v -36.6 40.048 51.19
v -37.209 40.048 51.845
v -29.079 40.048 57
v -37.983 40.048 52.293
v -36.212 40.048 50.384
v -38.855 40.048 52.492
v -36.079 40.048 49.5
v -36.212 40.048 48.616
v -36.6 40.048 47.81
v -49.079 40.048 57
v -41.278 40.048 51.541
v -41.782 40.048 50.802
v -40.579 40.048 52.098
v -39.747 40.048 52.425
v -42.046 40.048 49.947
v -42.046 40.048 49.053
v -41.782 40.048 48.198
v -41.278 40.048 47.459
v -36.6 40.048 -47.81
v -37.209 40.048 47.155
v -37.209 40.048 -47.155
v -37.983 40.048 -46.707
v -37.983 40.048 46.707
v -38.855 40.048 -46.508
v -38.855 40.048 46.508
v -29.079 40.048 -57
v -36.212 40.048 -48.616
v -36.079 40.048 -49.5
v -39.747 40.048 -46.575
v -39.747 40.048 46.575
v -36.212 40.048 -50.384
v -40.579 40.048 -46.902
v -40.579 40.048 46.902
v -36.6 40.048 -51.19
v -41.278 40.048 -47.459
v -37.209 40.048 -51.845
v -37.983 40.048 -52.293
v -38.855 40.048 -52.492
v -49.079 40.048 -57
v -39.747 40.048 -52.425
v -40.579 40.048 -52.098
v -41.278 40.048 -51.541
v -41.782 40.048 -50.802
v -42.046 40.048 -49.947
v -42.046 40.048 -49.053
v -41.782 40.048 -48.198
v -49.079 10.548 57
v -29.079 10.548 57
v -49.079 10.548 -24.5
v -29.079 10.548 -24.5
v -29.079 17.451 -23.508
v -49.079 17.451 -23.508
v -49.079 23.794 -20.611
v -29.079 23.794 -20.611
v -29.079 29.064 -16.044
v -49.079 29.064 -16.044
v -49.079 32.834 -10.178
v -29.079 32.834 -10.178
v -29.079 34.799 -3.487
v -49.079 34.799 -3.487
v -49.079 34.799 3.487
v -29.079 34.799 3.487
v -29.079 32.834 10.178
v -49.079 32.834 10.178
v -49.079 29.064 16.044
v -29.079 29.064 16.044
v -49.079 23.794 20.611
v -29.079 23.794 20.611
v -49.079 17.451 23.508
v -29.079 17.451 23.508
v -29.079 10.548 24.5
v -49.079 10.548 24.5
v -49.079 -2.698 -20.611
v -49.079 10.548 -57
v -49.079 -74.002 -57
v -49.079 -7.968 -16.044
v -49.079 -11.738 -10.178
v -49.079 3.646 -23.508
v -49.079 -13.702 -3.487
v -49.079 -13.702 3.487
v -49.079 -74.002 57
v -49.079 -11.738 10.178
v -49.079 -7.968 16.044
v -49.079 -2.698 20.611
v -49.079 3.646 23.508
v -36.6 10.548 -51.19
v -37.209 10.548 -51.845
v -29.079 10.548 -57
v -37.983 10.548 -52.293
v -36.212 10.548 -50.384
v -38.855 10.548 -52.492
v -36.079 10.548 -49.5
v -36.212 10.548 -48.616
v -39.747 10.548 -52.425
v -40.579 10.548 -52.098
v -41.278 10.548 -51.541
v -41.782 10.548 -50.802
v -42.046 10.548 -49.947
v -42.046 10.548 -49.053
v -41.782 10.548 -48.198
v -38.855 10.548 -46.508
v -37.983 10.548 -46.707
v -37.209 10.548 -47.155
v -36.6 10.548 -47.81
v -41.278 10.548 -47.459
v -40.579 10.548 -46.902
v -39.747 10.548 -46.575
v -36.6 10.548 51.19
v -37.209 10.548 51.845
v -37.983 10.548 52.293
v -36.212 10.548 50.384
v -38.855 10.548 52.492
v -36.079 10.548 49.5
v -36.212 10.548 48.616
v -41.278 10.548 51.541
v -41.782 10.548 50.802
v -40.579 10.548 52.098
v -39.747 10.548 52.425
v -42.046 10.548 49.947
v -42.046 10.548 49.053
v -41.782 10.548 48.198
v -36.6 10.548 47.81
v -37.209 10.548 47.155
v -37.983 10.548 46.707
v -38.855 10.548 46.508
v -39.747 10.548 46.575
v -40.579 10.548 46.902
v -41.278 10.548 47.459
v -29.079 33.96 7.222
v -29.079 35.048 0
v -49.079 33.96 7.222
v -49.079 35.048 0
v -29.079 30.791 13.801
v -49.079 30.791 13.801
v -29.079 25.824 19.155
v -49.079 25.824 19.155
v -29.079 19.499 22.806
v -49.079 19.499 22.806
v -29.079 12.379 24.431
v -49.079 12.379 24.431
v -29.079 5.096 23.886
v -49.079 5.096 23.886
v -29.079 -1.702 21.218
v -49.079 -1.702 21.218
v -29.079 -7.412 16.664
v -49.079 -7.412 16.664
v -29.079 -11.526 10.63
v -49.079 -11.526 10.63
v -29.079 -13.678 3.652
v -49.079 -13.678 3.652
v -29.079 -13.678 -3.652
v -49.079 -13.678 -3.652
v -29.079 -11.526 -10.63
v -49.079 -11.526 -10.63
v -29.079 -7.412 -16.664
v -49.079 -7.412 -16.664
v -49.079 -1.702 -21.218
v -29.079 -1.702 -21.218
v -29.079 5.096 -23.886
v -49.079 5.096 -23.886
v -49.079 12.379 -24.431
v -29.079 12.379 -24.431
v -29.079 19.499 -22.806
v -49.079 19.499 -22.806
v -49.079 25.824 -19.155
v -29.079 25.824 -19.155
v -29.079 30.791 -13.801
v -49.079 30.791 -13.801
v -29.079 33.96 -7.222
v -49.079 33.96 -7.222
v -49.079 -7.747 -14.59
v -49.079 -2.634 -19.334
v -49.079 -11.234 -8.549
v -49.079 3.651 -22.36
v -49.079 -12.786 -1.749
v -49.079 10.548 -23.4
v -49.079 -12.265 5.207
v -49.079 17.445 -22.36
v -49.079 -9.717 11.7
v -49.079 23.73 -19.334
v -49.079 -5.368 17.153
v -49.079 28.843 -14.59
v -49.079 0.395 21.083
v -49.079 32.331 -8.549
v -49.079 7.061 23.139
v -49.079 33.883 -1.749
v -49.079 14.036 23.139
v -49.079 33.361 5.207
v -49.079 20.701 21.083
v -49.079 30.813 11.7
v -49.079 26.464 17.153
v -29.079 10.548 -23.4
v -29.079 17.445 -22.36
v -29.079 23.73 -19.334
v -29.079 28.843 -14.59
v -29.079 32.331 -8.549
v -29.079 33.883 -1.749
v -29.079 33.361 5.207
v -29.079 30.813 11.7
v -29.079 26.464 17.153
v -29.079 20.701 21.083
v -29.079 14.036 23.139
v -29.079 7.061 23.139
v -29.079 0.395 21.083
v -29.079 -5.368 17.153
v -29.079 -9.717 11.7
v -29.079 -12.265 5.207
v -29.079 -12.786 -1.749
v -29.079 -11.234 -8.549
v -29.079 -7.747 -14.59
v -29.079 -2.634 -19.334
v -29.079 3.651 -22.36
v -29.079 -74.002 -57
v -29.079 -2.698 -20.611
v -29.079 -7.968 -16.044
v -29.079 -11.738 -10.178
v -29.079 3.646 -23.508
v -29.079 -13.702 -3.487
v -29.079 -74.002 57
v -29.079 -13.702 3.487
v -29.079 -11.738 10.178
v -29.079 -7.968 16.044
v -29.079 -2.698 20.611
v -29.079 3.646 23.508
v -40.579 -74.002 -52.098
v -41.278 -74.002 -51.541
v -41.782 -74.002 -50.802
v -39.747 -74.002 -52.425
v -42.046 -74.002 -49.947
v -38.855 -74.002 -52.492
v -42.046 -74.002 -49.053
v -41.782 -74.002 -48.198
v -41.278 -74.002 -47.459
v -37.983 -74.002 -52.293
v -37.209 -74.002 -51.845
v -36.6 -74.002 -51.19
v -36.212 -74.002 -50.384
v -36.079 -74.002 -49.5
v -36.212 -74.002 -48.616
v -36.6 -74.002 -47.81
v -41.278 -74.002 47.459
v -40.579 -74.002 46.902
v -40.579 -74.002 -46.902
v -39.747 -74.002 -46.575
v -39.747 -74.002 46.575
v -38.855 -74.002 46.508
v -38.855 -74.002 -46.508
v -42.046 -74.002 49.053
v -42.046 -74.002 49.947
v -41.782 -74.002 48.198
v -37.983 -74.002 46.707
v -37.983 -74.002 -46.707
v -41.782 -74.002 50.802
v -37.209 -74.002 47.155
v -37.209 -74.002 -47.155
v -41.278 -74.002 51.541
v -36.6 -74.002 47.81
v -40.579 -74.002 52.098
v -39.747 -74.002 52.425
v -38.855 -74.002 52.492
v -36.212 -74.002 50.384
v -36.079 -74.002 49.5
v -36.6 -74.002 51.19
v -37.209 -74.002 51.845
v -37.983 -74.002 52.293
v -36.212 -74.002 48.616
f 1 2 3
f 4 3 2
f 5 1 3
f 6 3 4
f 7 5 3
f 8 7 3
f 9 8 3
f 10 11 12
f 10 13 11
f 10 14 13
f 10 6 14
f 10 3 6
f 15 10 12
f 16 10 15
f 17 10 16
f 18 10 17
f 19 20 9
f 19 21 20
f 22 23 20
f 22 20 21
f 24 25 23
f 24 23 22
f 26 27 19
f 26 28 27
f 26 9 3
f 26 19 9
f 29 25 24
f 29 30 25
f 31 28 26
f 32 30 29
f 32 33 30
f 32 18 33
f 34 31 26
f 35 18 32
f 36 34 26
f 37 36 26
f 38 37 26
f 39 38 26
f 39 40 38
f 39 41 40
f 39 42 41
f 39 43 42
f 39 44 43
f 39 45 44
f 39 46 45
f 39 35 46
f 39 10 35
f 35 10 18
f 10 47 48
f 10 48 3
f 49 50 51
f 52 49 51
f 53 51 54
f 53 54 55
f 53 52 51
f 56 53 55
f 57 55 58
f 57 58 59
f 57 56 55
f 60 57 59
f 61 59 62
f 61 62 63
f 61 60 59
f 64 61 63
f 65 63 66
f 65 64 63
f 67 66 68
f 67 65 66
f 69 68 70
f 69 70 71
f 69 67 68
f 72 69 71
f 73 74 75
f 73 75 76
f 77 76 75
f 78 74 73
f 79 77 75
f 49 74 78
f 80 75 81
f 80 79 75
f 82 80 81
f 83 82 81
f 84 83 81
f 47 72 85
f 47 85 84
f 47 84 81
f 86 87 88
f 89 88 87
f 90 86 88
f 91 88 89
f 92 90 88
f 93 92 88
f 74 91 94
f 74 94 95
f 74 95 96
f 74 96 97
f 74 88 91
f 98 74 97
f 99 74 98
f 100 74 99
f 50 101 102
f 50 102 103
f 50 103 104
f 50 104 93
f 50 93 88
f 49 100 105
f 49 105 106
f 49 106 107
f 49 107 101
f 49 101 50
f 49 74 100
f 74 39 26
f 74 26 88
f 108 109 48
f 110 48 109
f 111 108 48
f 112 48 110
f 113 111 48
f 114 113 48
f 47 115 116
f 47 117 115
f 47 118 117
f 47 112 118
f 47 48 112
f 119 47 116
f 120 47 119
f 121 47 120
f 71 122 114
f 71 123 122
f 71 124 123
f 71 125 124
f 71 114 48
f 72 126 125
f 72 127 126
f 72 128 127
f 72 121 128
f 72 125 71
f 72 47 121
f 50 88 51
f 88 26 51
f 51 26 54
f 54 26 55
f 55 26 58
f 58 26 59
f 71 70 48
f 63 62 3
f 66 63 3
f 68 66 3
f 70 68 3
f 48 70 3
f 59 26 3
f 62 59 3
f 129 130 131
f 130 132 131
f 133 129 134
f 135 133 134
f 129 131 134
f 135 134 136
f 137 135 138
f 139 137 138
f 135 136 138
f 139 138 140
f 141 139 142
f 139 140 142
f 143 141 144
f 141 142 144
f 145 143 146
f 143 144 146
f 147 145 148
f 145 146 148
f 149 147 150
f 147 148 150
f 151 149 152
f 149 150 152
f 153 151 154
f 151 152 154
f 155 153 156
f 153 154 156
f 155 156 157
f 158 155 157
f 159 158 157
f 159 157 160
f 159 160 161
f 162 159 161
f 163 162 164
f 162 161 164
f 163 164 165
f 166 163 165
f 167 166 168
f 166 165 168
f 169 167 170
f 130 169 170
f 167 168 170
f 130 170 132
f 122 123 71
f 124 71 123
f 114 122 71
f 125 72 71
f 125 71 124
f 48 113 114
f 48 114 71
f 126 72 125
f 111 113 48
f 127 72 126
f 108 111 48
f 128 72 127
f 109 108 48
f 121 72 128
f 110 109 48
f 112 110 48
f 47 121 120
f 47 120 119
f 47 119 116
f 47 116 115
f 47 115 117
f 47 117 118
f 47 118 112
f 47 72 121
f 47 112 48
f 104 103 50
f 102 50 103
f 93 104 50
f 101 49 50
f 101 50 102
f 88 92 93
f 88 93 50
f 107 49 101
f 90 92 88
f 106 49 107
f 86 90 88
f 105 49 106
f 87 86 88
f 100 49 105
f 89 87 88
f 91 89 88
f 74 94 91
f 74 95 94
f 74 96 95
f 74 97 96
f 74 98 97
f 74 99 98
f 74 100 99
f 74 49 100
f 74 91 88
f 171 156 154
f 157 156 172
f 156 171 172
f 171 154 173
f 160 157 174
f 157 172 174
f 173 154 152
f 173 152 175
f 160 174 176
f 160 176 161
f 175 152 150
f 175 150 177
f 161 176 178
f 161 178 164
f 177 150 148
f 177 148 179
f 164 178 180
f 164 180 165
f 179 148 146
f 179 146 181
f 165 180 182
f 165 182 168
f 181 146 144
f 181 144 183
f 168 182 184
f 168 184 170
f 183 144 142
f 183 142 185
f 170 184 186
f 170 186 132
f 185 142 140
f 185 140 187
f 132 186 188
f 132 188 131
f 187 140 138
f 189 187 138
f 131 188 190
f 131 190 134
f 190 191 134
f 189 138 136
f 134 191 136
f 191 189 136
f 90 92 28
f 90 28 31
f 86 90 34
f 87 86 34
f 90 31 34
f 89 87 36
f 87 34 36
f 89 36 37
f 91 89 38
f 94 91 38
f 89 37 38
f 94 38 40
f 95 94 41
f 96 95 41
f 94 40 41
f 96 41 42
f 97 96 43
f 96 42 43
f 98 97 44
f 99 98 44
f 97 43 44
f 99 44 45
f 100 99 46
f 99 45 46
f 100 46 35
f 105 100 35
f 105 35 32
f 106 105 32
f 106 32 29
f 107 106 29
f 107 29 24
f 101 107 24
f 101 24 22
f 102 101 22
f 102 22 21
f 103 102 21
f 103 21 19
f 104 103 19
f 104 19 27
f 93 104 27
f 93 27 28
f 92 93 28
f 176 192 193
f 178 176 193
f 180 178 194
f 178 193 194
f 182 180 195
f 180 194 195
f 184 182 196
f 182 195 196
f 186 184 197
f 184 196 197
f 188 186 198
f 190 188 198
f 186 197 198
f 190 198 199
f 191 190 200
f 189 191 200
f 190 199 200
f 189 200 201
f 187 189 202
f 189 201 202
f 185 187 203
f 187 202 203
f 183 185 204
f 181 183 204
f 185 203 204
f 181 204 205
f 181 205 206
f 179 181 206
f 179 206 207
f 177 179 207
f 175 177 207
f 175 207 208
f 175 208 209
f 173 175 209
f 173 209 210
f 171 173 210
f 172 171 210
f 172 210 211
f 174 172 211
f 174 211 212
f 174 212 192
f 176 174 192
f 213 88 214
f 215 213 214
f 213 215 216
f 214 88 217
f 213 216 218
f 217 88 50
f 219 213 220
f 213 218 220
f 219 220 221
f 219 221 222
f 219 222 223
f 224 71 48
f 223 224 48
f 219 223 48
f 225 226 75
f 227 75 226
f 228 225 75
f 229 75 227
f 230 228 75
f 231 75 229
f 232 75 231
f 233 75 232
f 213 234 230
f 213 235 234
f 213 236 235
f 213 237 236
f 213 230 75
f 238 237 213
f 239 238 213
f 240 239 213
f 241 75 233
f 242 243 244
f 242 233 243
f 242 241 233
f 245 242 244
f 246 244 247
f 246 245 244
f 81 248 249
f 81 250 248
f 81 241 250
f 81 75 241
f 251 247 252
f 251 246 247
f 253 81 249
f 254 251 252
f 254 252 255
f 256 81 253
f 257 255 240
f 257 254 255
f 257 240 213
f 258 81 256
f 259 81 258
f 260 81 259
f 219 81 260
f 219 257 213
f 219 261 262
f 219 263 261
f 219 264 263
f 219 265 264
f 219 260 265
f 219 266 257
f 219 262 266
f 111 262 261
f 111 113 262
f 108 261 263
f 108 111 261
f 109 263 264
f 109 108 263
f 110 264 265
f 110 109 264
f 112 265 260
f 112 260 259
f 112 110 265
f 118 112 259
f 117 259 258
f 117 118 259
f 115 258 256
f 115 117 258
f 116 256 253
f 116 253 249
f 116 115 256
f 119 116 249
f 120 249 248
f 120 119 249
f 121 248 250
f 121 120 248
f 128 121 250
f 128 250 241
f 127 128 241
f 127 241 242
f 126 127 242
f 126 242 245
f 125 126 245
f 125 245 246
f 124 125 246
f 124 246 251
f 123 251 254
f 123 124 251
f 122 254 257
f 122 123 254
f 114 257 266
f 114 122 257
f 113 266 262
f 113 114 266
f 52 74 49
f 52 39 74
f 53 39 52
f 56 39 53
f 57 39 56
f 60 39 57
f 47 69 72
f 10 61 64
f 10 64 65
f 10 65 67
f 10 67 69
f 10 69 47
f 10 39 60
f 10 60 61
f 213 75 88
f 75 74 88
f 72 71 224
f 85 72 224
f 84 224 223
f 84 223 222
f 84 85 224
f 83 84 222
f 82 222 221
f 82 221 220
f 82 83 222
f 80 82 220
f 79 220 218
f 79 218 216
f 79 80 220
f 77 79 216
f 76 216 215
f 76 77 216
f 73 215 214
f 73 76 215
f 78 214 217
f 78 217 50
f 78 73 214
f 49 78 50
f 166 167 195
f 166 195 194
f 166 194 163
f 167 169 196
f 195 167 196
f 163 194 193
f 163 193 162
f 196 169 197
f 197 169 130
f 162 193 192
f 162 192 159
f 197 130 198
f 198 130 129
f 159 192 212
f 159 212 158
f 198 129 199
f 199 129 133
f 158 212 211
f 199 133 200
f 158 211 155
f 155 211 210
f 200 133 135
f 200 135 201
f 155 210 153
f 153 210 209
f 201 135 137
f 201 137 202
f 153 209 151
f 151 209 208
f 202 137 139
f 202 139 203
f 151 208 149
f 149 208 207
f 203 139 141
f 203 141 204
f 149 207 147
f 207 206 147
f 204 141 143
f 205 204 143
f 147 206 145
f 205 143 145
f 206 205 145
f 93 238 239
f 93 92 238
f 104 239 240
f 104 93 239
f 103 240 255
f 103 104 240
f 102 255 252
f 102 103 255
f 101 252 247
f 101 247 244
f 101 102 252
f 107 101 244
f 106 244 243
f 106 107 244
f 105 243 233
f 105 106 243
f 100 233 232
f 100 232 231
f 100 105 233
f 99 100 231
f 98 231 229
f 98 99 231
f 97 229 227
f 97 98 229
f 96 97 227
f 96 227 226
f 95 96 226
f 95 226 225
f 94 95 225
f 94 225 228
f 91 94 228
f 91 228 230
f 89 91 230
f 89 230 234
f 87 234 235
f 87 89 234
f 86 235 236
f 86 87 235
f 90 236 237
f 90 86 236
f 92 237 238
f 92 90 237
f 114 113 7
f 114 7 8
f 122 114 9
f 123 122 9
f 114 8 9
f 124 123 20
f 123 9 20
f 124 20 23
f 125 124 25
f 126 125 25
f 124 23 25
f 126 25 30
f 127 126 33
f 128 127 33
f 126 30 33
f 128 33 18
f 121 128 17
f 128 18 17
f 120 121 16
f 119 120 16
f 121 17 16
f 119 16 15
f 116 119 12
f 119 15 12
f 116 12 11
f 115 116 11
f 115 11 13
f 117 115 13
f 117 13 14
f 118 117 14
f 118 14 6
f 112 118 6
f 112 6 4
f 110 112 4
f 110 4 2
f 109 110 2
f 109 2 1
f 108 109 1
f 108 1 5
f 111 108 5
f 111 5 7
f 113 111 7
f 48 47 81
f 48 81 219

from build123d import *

# Parameters (mm, degrees)
BOSS_EXTRUDE2_DEPTH = 20
BOSS_EXTRUDE3_DEPTH = 20
SKETCH3_R           = 3
CUT_EXTRUDE1_DEPTH  = 59
SKETCH4_W           = 20
SKETCH4_H           = 114
SKETCH4_R           = 3
BOSS_EXTRUDE5_DEPTH = 55.05
SKETCH5_R           = 23.4
CUT_EXTRUDE2_DEPTH  = 34


with BuildPart() as part:
    # Sketch1 → Revolve1 (revolve)
    with BuildSketch(Plane.XY):
        Polygon((-44.079026729, 28.048179476), (-34.079026729, 28.048179476), (-34.079026729, 25.048179476), (-29.079026729, 25.048179476), (-29.079026729, 35.048179476), (-49.079026729, 35.048179476), (-49.079026729, 28.048179476), (-46.079026729, 28.048179476), (-46.079026729, 29.048179476), (-44.079026729, 29.048179476), align=None)
    revolve(axis=Axis((-85.067898311, 10.548179476, 0), (1, 0, 0)))

    # Sketch5 → Cut-Extrude2 (cut)
    with BuildSketch(Plane(origin=(-29.079026729, 0, 0), x_dir=(0, 0, -1), z_dir=(1, 0, 0))):
        with Locations((0, 10.548179476)):
            Circle(SKETCH5_R)
    extrude(amount=-CUT_EXTRUDE2_DEPTH, mode=Mode.SUBTRACT)


with BuildPart() as body_2:
    # Sketch2 → Boss-Extrude2 (new body)
    with BuildSketch(Plane.ZY.offset(49.079026729)):
        with BuildLine():
            Line((-57, 10.548179476), (-24.5, 10.548179476))
            ThreePointArc((-24.5, 10.548179476), (0, 35.048179476), (24.5, 10.548179476))
            Line((24.5, 10.548179476), (57, 10.548179476))
            Line((57, 10.548179476), (57, 40.048179476))
            Line((57, 40.048179476), (-57, 40.048179476))
            Line((-57, 40.048179476), (-57, 10.548179476))
        make_face()
    extrude(amount=-BOSS_EXTRUDE2_DEPTH)


with BuildPart() as body_3:
    # Sketch2<3> → Boss-Extrude3 (new body)
    with BuildSketch(Plane.ZY.offset(49.079026729)):
        with BuildLine():
            ThreePointArc((24.5, 10.548179476), (0, -13.951820524), (-24.5, 10.548179476))
            Line((-24.5, 10.548179476), (-57, 10.548179476))
            Line((-57, 10.548179476), (-57, -18.951820524))
            Line((-57, -18.951820524), (57, -18.951820524))
            Line((57, -18.951820524), (57, 10.548179476))
            Line((57, 10.548179476), (24.5, 10.548179476))
        make_face()
    extrude(amount=-BOSS_EXTRUDE3_DEPTH)


with BuildPart() as cut_extrude1_tool:
    # Sketch3 → Cut-Extrude1 (new body)
    with BuildSketch(Plane(origin=(0, 40.048179476, 0), x_dir=(1, 0, 0), z_dir=(0, 1, 0))):
        with Locations((-39.079026729, 49.5)):
            Circle(SKETCH3_R)
        with Locations((-39.079026729, -49.5)):
            Circle(SKETCH3_R)
    extrude(amount=-CUT_EXTRUDE1_DEPTH)


with BuildPart() as body_2_1:
    add(body_2.part)

    # Cut-Extrude1: cut by cut_extrude1_tool
    add(cut_extrude1_tool.part, mode=Mode.SUBTRACT)


with BuildPart() as body_3_1:
    add(body_3.part)

    # Cut-Extrude1: cut by cut_extrude1_tool
    add(cut_extrude1_tool.part, mode=Mode.SUBTRACT)

    # Sketch4 → Boss-Extrude5 (add)
    with BuildSketch(Plane.XZ.offset(18.951820524)):
        with Locations((-39.079026729, 0)):
            Rectangle(SKETCH4_W, SKETCH4_H)
        with Locations((-39.079026729, 49.5)):
            Circle(SKETCH4_R, mode=Mode.SUBTRACT)
        with Locations((-39.079026729, -49.5)):
            Circle(SKETCH4_R, mode=Mode.SUBTRACT)
    extrude(amount=BOSS_EXTRUDE5_DEPTH)


solid = Compound([part.part, body_2_1.part, body_3_1.part])
